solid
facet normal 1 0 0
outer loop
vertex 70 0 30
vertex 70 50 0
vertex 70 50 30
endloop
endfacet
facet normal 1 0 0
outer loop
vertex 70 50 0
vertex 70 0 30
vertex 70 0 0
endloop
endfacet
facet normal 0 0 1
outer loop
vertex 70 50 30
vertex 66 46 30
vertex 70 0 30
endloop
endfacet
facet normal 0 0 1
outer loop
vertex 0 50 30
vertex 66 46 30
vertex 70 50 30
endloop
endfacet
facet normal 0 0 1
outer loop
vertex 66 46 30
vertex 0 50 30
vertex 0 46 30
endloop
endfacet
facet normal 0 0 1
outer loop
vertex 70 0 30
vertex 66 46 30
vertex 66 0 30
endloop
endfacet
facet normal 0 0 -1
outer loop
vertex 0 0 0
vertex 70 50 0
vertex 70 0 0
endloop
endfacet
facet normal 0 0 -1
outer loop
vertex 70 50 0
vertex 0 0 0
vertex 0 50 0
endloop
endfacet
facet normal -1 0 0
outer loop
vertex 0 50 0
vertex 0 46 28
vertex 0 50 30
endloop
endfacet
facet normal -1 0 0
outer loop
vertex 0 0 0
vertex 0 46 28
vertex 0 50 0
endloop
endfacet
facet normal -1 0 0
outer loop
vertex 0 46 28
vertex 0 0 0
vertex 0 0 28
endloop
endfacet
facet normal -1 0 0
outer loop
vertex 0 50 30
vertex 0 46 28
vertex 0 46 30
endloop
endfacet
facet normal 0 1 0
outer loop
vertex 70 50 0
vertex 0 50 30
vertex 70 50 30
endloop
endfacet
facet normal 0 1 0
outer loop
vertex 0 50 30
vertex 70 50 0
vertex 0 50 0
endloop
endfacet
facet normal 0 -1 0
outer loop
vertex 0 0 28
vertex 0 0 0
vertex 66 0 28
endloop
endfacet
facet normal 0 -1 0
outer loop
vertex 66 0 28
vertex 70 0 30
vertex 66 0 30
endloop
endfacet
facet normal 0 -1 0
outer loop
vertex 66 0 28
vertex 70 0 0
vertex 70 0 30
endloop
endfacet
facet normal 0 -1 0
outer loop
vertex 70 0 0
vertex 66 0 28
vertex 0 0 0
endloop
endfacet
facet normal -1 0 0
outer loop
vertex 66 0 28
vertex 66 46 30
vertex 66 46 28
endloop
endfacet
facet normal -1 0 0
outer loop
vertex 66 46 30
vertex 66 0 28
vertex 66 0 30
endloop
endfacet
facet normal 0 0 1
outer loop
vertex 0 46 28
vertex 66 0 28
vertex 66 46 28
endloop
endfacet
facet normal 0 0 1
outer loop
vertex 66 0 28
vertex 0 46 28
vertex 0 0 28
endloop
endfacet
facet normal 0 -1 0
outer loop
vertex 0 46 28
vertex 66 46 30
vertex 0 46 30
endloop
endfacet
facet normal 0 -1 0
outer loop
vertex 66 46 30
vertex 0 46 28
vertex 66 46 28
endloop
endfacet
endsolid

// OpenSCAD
// Two-part enclosure for a small electronics board (e.g. Arduino-based logger)
// Print orientation: box standing on the bed, lid plate flat on the bed.
// The file renders to two separate solid bodies with no overlapping material.

// ---------------- Parameters ----------------
box_x      = 70;    // box outer size in X (mm)
box_y      = 50;    // box outer size in Y (mm)
box_z      = 30;    // box outer size in Z (mm)
box_wall   = 2;     // box wall thickness (mm)
box_floor  = 2;     // box floor thickness (mm)

lip_x      = 65.6;  // lip outer size in X (mm)
lip_y      = 45.6;  // lip outer size in Y (mm)
lip_t      = 1.5;   // lip wall thickness (mm)
lip_h      = 4;     // lip height above plate (mm)
lip_clear  = 0.2;   // clearance between lip inner wall and box opening (mm)

eps        = 0.5;   // cutter overshoot past faces (mm)

$fn = 64;

// Derived dimensions
box_inner_x = box_x - 2*box_wall;   // 66
box_inner_y = box_y - 2*box_wall;   // 46
plate_t     = 2;                    // lid plate thickness (mm)

// Lip inner size = box opening - clearance on each side
lip_inner_x = box_inner_x - 2*lip_clear;   // 65.6
lip_inner_y = box_inner_y - 2*lip_clear;   // 45.6

// ---------------- Model ----------------
union() {
    // Part 1: Box, open top
    difference() {
        cube([box_x, box_y, box_z]);
        translate([0, 0, box_z - box_wall])
            cube([box_inner_x, box_inner_y, box_wall + eps]);
    }

    // Part 2: Lid plate with sliding lip, printed upside down
    union() {
        // Base plate
        translate([box_x/2 - 32.8, box_y/2 - 25, 0])
            cube([lip_x, lip_y, plate_t]);

        // Lip: solid block whose top face is the ceiling;
        // the hollowed interior overlaps the plate slightly for a clean union.
        translate([box_x/2 - lip_inner_x/2, box_y/2 - lip_inner_y/2,
                   plate_t - 0.01])
            difference() {
                cube([lip_inner_x + 2*lip_clear, lip_inner_y + 2*lip_clear,
                      lip_h + 0.01]);
                translate([0, 0, plate_t])
                    cube([lip_inner_x, lip_inner_y, lip_t]);
            }
    }
}
